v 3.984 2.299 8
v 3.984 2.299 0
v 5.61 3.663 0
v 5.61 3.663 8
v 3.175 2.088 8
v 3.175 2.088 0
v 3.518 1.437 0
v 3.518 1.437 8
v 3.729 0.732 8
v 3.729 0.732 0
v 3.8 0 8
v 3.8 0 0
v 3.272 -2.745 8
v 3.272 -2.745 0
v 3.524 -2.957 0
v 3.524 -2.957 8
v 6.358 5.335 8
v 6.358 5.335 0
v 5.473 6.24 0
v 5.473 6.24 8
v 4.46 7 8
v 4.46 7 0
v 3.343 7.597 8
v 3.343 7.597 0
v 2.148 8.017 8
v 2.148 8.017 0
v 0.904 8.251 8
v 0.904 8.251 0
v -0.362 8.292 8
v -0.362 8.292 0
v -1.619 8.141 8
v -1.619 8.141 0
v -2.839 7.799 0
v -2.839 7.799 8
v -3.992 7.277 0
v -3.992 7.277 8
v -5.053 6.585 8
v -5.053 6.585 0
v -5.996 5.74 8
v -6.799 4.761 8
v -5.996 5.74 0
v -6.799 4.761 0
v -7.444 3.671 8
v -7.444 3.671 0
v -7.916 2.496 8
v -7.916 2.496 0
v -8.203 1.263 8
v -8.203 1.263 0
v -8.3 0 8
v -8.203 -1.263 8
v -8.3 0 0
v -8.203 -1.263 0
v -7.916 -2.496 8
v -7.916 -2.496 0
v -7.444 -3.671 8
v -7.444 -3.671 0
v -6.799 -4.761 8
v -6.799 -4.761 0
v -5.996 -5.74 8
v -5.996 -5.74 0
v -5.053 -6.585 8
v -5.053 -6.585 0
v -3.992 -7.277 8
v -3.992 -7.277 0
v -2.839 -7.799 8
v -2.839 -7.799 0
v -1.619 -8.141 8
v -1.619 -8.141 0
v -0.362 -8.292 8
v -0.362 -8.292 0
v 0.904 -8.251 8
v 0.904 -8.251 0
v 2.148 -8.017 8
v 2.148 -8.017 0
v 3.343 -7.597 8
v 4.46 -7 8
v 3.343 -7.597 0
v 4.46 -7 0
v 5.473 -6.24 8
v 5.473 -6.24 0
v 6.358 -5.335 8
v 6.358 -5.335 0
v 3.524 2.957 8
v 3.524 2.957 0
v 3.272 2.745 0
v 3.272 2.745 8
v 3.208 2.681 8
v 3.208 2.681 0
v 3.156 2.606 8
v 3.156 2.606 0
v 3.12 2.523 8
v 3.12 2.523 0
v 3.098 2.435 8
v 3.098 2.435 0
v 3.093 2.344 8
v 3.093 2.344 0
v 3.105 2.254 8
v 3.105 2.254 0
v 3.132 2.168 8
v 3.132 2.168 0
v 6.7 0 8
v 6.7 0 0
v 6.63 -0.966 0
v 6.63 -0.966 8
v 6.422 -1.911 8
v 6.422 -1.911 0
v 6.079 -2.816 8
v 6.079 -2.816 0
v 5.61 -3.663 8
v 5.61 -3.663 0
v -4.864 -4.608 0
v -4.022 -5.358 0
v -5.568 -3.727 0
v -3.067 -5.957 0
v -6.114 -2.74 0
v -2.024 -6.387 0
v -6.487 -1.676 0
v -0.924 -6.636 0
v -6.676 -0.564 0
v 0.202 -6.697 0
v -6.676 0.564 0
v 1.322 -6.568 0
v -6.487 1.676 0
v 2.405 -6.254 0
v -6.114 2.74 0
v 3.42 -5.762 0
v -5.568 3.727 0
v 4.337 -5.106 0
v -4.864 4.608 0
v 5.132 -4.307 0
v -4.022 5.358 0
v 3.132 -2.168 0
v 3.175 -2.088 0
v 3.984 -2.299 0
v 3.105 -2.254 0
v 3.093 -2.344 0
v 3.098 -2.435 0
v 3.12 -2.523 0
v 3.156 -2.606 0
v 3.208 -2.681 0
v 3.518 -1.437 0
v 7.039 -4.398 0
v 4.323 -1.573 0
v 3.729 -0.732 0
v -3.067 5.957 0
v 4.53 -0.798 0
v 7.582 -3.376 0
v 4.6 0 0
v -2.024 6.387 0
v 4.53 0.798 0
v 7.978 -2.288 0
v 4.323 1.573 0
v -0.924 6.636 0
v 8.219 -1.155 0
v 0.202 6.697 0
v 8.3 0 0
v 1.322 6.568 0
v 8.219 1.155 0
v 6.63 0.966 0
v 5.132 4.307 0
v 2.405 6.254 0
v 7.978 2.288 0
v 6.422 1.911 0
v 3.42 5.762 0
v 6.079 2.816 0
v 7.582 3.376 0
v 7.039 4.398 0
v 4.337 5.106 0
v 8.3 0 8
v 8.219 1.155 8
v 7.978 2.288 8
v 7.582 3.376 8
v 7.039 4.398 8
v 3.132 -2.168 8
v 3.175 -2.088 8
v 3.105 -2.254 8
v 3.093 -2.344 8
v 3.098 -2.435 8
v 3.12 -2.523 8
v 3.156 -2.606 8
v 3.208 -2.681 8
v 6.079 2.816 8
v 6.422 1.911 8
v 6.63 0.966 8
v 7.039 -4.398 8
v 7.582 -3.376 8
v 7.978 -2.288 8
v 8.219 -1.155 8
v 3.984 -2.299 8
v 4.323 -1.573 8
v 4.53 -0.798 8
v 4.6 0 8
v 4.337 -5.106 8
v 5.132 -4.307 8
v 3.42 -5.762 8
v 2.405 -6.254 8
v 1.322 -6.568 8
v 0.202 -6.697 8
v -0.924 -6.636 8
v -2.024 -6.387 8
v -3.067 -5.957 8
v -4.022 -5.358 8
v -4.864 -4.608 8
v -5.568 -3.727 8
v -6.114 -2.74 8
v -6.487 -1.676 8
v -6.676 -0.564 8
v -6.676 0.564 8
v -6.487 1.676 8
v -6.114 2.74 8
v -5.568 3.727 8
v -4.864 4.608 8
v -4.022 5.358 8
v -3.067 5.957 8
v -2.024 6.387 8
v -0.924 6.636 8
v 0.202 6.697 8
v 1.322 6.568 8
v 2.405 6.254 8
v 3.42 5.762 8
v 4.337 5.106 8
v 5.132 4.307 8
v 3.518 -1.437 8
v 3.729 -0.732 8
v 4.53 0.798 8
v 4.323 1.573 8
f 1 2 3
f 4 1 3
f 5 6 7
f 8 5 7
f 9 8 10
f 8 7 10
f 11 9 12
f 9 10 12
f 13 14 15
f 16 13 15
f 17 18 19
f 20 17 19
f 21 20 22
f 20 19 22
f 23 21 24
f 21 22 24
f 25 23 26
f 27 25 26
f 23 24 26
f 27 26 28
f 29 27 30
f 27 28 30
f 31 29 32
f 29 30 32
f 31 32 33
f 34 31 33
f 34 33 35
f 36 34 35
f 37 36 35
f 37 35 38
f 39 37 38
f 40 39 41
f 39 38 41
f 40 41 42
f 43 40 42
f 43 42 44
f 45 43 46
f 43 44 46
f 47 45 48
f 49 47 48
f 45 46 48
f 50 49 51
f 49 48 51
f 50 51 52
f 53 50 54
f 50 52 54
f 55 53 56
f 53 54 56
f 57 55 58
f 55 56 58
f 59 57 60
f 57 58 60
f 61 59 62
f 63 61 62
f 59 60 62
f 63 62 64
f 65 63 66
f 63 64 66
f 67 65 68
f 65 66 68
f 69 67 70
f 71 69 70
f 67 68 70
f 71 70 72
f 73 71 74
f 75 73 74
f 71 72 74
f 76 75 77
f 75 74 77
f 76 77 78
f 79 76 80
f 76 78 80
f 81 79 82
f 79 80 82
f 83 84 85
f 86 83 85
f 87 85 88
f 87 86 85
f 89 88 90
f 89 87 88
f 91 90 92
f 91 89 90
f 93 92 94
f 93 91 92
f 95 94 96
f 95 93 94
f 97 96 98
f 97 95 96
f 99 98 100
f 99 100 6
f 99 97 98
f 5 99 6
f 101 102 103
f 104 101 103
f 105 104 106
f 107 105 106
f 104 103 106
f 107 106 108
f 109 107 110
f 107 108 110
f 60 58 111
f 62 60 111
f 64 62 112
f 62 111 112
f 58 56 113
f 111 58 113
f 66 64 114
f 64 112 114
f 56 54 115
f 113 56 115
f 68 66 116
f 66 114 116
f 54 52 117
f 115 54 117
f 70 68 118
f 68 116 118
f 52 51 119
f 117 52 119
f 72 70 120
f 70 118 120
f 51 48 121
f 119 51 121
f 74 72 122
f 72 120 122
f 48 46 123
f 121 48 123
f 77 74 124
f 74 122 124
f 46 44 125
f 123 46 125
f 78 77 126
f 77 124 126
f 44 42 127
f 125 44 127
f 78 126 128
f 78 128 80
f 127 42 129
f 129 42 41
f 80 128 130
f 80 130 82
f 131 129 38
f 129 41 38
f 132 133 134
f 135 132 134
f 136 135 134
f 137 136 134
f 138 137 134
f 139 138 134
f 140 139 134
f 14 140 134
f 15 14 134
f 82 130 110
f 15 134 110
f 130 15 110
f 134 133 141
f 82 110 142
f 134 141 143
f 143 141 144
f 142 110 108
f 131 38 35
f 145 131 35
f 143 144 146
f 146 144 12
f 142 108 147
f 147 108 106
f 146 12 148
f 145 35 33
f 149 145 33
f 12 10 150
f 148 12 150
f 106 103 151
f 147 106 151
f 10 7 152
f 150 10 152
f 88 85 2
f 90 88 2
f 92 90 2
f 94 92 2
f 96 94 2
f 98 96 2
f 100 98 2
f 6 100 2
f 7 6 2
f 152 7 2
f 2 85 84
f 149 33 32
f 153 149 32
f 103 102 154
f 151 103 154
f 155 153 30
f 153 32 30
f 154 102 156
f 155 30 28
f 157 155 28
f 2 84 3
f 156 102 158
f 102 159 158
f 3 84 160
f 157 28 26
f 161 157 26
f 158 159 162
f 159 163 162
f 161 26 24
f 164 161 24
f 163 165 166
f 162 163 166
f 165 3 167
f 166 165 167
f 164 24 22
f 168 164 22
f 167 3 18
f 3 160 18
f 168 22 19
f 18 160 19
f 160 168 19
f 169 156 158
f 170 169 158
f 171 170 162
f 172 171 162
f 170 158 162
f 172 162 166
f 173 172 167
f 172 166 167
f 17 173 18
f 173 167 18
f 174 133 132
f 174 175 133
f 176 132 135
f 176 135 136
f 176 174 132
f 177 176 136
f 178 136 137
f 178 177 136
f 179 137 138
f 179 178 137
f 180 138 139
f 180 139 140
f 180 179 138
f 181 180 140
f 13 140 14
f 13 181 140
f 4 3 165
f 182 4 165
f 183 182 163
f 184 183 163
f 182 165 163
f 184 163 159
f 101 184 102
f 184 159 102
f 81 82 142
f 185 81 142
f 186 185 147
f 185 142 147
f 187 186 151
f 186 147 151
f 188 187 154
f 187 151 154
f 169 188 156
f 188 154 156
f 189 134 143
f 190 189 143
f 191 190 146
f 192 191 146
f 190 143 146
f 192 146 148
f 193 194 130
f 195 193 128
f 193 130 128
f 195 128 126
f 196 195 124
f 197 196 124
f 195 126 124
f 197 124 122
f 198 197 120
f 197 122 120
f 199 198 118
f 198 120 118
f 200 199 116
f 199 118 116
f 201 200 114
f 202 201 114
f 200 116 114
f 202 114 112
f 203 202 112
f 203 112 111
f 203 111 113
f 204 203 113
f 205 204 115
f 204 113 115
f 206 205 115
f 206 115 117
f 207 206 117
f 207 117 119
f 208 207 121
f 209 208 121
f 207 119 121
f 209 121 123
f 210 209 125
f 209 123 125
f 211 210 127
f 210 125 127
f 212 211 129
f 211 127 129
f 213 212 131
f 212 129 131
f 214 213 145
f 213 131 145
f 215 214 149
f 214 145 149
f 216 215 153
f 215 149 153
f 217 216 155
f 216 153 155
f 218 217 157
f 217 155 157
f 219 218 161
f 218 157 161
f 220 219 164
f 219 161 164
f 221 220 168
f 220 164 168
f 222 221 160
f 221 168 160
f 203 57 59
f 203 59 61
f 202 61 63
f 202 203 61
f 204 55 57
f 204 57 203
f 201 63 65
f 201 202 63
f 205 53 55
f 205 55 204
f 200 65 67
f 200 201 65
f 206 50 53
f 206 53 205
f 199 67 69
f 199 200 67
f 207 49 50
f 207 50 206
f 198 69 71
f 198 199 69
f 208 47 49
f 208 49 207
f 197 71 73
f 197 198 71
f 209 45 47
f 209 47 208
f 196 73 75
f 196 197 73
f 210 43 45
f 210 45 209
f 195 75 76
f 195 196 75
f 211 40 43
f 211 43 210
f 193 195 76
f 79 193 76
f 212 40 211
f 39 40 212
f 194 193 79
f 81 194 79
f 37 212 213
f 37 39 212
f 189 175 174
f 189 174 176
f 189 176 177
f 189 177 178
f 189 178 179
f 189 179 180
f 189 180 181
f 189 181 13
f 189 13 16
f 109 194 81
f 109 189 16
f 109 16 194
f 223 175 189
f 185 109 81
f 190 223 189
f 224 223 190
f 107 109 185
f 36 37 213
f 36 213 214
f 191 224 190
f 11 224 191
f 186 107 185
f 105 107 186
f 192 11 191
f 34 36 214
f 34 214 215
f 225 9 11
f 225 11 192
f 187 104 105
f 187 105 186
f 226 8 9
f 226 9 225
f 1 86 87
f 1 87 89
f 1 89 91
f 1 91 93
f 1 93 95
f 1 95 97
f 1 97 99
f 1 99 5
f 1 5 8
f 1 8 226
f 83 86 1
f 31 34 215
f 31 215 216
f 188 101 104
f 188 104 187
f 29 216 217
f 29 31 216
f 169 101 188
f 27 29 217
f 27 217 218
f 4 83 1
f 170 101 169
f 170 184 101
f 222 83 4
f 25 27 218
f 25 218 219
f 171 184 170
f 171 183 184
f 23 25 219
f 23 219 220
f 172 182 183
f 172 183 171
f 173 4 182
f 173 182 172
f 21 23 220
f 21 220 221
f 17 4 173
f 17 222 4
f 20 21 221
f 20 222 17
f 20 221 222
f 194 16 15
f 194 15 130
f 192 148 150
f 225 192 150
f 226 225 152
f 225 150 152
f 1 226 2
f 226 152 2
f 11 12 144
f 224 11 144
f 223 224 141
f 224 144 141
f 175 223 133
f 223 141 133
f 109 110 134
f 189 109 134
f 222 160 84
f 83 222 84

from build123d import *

# Parameters (mm, degrees)
F1_DEPTH = 8
F2_R     = 0.5


with BuildPart() as f1:
    # F0 (on Top) → F1 (new body)
    with BuildSketch(Plane.XY):
        with BuildLine():
            ThreePointArc((5.1324977689, -4.3066769849), (-6.7, 0), (5.1324977689, 4.3066769849))
            Line((5.1324977689, 4.3066769849), (6.3581688779, 5.3351371604))
            ThreePointArc((6.3581688779, 5.3351371604), (-8.3, 0), (6.3581688779, -5.3351371604))
            Line((6.3581688779, -5.3351371604), (5.1324977689, -4.3066769849))
        make_face()
        with BuildLine():
            Line((6.3581688779, 5.3351371604), (5.1324977689, 4.3066769849))
            ThreePointArc((5.1324977689, 4.3066769849), (5.3808860494, 3.9920001658), (5.6100093148, 3.6630309155))
            ThreePointArc((5.6100093148, 3.6630309155), (6.4217233828, 1.9108816801), (6.7, 0))
            ThreePointArc((6.7, 0), (6.4217233828, -1.9108816801), (5.6100093148, -3.6630309155))
            ThreePointArc((5.6100093148, -3.6630309155), (5.3808860494, -3.9920001658), (5.1324977689, -4.3066769849))
            Line((5.1324977689, -4.3066769849), (6.3581688779, -5.3351371604))
            ThreePointArc((6.3581688779, -5.3351371604), (7.7994487525, -2.8387671896), (8.3, 0))
            ThreePointArc((8.3, 0), (7.7994487525, 2.8387671896), (6.3581688779, 5.3351371604))
        make_face()
        with BuildLine():
            Line((5.1324977689, 4.3066769849), (3.5238044383, 2.9568230046))
            ThreePointArc((3.5238044383, 2.9568230046), (3.7684541862, 2.6379448528), (3.9843353171, 2.2989284636))
            Line((3.9843353171, 2.2989284636), (5.6100093148, 3.6630309155))
            ThreePointArc((5.6100093148, 3.6630309155), (5.3808860494, 3.9920001658), (5.1324977689, 4.3066769849))
        make_face()
        with BuildLine():
            ThreePointArc((2.9109688839, 2.4425929168), (3.570831959, 1.2996765446), (3.8, 0))
            ThreePointArc((3.8, 0), (3.570831959, -1.2996765446), (2.9109688839, -2.4425929168))
            Line((2.9109688839, -2.4425929168), (3.5238044383, -2.9568230046))
            ThreePointArc((3.5238044383, -2.9568230046), (3.7684541862, -2.6379448528), (3.9843353171, -2.2989284636))
            ThreePointArc((3.9843353171, -2.2989284636), (4.4434188672, -1.1899700713), (4.6, 0))
            ThreePointArc((4.6, 0), (4.4434188672, 1.1899700713), (3.9843353171, 2.2989284636))
            ThreePointArc((3.9843353171, 2.2989284636), (3.7684541862, 2.6379448528), (3.5238044383, 2.9568230046))
            Line((3.5238044383, 2.9568230046), (2.9109688839, 2.4425929168))
        make_face()
        with BuildLine():
            ThreePointArc((3.9843353171, -2.2989284636), (3.7684541862, -2.6379448528), (3.5238044383, -2.9568230046))
            Line((3.5238044383, -2.9568230046), (5.1324977689, -4.3066769849))
            ThreePointArc((5.1324977689, -4.3066769849), (5.3808860494, -3.9920001658), (5.6100093148, -3.6630309155))
            Line((5.6100093148, -3.6630309155), (3.9843353171, -2.2989284636))
        make_face()
    extrude(amount=F1_DEPTH)

    # F2
    f2_edges = [f1.edges().sort_by_distance(p)[0] for p in [
        (2.910969, 2.442593, 4),
        (2.910969, -2.442593, 4),
    ]]
    fillet(f2_edges, radius=F2_R)


solid = f1.part
